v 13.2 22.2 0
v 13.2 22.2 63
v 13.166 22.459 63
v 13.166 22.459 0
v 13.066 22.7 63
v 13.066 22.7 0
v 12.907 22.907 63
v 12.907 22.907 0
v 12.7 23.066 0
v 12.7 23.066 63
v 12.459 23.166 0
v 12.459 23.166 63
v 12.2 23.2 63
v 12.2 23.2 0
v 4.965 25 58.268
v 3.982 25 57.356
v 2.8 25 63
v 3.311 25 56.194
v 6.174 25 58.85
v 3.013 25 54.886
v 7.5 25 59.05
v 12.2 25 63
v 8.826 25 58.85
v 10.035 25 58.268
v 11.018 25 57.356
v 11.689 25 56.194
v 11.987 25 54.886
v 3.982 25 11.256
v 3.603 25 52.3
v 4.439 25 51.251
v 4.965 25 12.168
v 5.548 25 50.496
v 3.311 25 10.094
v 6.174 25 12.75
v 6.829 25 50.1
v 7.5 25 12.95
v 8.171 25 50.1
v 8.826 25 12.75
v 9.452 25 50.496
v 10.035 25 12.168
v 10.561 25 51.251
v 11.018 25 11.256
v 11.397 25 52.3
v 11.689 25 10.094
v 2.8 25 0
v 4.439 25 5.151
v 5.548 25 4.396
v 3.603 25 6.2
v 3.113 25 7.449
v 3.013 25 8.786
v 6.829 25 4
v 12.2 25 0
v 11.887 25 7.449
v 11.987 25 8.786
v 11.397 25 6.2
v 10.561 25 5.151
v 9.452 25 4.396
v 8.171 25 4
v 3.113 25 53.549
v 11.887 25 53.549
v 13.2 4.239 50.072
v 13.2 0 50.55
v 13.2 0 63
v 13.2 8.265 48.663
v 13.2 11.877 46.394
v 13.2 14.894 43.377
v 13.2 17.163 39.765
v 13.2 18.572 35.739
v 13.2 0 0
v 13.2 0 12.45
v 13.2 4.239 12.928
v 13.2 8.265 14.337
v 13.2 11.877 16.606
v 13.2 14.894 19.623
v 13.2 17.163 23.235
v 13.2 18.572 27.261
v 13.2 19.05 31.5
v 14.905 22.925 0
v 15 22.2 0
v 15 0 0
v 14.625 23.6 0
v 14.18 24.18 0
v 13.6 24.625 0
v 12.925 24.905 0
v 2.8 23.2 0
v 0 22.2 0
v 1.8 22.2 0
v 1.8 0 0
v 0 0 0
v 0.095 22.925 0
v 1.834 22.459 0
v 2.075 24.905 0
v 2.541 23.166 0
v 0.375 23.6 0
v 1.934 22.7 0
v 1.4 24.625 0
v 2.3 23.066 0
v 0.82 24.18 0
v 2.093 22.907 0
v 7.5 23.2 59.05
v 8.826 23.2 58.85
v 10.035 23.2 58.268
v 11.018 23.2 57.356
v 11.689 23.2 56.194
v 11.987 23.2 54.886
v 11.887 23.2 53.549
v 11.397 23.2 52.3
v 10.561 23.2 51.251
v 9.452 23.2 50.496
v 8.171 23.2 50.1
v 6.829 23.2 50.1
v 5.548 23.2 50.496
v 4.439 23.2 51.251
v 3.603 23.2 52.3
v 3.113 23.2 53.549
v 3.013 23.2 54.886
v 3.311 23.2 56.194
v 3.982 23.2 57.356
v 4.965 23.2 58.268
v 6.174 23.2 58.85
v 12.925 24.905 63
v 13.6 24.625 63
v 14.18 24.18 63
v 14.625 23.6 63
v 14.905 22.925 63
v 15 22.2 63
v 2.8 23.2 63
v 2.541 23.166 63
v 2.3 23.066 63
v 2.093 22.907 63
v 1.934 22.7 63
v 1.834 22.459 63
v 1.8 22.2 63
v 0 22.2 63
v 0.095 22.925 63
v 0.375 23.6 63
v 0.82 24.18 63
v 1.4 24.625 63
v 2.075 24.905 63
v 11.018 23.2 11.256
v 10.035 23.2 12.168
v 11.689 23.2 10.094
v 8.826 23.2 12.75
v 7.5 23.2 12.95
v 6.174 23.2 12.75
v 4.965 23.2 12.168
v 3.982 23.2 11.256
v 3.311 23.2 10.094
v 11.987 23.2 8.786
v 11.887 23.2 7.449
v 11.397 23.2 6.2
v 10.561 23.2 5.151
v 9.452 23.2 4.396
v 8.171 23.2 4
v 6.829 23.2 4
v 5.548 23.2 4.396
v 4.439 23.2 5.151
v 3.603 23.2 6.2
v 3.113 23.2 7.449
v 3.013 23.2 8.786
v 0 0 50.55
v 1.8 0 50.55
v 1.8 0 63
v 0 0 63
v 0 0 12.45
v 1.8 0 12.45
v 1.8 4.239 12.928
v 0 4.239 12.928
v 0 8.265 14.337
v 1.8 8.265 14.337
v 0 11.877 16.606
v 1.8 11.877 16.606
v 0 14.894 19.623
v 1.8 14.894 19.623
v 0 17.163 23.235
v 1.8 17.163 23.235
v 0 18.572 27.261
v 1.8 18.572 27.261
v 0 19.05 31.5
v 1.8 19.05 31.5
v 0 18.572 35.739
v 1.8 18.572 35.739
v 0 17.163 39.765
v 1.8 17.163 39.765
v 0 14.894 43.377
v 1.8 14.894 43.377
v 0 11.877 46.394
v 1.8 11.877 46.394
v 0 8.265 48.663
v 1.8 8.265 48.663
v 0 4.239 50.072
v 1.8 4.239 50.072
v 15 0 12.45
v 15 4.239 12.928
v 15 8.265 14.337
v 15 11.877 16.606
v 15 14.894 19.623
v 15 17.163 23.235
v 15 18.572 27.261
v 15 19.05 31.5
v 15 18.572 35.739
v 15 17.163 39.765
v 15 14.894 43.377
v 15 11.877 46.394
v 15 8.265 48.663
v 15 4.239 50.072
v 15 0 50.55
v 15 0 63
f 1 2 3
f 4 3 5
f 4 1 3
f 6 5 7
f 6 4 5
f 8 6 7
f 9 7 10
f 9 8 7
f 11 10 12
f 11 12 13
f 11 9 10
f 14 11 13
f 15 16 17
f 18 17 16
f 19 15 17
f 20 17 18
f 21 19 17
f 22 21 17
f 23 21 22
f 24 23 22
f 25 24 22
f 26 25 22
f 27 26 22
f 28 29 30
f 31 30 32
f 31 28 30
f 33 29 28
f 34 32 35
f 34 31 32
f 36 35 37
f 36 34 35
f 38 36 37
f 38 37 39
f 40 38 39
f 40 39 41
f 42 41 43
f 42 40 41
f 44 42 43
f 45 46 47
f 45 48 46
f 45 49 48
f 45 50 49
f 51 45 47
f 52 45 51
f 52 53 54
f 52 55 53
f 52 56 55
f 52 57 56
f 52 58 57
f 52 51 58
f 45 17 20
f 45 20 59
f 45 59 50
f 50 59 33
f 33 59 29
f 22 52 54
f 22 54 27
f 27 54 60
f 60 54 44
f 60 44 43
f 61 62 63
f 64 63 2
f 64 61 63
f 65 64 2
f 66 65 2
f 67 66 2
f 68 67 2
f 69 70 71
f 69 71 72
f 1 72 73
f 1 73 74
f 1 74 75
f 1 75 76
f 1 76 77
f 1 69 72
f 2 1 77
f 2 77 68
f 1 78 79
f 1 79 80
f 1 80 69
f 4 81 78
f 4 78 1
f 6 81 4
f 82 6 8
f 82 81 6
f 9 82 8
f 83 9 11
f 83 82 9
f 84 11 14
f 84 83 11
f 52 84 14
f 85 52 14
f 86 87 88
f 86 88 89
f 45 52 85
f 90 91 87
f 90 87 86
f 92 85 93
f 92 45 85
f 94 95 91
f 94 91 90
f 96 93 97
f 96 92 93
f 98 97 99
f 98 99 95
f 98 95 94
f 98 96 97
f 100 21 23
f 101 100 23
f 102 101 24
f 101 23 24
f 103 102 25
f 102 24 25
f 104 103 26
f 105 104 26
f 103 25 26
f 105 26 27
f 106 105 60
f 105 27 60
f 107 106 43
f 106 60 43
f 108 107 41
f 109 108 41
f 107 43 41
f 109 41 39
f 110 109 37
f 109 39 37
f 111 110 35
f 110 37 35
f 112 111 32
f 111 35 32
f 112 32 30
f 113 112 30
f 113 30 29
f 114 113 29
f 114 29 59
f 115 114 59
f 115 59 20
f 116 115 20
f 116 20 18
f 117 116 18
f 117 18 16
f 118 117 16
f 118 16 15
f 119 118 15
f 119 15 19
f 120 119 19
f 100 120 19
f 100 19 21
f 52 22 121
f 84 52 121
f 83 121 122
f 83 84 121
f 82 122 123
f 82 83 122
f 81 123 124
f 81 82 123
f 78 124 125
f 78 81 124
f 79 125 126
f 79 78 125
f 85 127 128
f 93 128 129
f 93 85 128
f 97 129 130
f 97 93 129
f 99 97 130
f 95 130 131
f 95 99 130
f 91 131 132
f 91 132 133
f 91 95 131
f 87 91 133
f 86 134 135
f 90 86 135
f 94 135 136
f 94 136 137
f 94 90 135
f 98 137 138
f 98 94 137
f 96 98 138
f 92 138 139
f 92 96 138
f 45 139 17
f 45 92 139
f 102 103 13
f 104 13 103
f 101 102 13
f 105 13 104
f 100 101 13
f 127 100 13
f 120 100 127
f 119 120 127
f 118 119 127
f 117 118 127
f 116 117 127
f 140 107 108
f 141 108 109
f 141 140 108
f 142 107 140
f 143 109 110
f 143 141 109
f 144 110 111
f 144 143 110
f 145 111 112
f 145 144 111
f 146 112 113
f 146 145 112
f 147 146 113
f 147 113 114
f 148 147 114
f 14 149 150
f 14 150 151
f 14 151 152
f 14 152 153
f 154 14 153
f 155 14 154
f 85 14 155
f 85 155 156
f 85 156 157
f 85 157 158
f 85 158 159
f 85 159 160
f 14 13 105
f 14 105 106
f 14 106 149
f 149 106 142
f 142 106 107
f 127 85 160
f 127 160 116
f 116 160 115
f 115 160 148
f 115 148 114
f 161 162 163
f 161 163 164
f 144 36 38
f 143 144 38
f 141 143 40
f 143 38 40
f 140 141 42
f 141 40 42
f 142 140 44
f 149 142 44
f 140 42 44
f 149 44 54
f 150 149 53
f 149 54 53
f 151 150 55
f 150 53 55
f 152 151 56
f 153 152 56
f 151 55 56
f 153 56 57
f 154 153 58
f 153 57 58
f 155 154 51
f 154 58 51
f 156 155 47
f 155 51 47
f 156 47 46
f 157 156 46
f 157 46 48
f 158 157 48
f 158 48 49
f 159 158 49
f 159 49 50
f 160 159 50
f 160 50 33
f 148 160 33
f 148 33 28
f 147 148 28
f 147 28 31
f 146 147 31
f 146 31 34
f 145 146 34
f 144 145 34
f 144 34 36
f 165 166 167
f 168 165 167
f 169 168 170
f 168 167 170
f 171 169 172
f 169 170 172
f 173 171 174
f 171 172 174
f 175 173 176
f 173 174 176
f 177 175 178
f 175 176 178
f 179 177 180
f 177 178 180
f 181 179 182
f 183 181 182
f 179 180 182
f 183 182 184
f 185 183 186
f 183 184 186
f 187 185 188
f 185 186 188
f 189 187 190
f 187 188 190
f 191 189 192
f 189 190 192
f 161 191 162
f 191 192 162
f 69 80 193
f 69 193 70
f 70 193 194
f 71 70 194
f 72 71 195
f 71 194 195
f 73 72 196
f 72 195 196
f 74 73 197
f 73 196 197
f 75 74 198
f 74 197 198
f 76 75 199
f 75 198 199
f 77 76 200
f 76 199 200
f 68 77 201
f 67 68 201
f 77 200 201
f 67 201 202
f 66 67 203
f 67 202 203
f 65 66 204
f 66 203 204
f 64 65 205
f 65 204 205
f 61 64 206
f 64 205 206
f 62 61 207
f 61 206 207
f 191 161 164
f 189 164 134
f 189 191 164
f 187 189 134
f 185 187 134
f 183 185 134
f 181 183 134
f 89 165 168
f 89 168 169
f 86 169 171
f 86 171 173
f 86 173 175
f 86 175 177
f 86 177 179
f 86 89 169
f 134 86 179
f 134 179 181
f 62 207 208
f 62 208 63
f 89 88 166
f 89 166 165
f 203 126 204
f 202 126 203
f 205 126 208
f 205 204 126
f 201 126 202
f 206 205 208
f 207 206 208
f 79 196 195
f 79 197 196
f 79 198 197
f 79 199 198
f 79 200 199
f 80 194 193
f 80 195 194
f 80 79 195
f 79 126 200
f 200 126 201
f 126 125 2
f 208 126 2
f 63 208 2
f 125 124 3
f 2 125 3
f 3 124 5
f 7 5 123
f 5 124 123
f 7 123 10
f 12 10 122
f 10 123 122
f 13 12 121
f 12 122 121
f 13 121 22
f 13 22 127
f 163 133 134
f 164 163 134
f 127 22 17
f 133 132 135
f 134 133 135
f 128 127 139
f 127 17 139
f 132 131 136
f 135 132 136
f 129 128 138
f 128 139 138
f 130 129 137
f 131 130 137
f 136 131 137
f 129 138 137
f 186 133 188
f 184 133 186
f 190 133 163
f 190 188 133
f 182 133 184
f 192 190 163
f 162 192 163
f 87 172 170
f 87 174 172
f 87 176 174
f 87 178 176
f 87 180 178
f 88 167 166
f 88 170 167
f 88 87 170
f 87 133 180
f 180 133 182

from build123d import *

# Parameters (mm, degrees)
FLANGE_BASE1_DEPTH    = 63
ESBO_O6_R             = 19.05
CORTE_EXTRUS_O1_DEPTH = 20
CORTE_EXTRUS_O2_REACH = 71.419
ESBO_O7_R             = 4.5


# Sheet-metal steps are written as plain solids
with BuildPart() as part:
    # Esboço1 → Flange-base1 (new body)
    with BuildSketch(Plane.XY):
        with BuildLine():
            Line((0, 0), (0, 22.2))
            ThreePointArc((0, 22.2), (0.820101013, 24.179898987), (2.8, 25))
            Line((2.8, 25), (12.2, 25))
            ThreePointArc((12.2, 25), (14.179898987, 24.179898987), (15, 22.2))
            Line((15, 22.2), (15, 0))
            Line((15, 0), (13.2, 0))
            Line((13.2, 0), (13.2, 22.2))
            ThreePointArc((13.2, 22.2), (12.907106781, 22.907106781), (12.2, 23.2))
            Line((12.2, 23.2), (2.8, 23.2))
            ThreePointArc((2.8, 23.2), (2.092893219, 22.907106781), (1.8, 22.2))
            Line((1.8, 22.2), (1.8, 0))
            Line((1.8, 0), (0, 0))
        make_face()
    extrude(amount=FLANGE_BASE1_DEPTH)

    # Esboço6 → Corte-extrusão1 (cut)
    with BuildSketch(Plane(origin=(15, 0, 0), x_dir=(0, 0, -1), z_dir=(1, 0, 0))):
        with Locations((-31.5, 0)):
            Circle(ESBO_O6_R)
    extrude(amount=-CORTE_EXTRUS_O1_DEPTH, mode=Mode.SUBTRACT)

    # Esboço7 → Corte-extrusão2 (cut, up to next)
    with BuildSketch(Plane(origin=(0, 25, 0), x_dir=(1, 0, 0), z_dir=(0, 1, 0)), mode=Mode.PRIVATE) as corte_extrus_o2_sk1:
        with Locations(Location((7.5, -54.55, 0), (0, 0, 270))):
            Circle(ESBO_O7_R)
    corte_extrus_o2_tool1 = extrude(corte_extrus_o2_sk1.sketch, amount=-CORTE_EXTRUS_O2_REACH, mode=Mode.PRIVATE) & part.part
    # Esboço7 → Corte-extrusão2 (cut, up to next)
    with BuildSketch(Plane(origin=(0, 25, 0), x_dir=(1, 0, 0), z_dir=(0, 1, 0)), mode=Mode.PRIVATE) as corte_extrus_o2_sk2:
        with Locations(Location((7.5, -8.45, 0), (0, 0, 270))):
            Circle(ESBO_O7_R)
    corte_extrus_o2_tool2 = extrude(corte_extrus_o2_sk2.sketch, amount=-CORTE_EXTRUS_O2_REACH, mode=Mode.PRIVATE) & part.part
    add(corte_extrus_o2_tool1.solids().sort_by_distance((7.5, 25, 54.55))[0], mode=Mode.SUBTRACT)
    add(corte_extrus_o2_tool2.solids().sort_by_distance((7.5, 25, 8.45))[0], mode=Mode.SUBTRACT)


solid = part.part
